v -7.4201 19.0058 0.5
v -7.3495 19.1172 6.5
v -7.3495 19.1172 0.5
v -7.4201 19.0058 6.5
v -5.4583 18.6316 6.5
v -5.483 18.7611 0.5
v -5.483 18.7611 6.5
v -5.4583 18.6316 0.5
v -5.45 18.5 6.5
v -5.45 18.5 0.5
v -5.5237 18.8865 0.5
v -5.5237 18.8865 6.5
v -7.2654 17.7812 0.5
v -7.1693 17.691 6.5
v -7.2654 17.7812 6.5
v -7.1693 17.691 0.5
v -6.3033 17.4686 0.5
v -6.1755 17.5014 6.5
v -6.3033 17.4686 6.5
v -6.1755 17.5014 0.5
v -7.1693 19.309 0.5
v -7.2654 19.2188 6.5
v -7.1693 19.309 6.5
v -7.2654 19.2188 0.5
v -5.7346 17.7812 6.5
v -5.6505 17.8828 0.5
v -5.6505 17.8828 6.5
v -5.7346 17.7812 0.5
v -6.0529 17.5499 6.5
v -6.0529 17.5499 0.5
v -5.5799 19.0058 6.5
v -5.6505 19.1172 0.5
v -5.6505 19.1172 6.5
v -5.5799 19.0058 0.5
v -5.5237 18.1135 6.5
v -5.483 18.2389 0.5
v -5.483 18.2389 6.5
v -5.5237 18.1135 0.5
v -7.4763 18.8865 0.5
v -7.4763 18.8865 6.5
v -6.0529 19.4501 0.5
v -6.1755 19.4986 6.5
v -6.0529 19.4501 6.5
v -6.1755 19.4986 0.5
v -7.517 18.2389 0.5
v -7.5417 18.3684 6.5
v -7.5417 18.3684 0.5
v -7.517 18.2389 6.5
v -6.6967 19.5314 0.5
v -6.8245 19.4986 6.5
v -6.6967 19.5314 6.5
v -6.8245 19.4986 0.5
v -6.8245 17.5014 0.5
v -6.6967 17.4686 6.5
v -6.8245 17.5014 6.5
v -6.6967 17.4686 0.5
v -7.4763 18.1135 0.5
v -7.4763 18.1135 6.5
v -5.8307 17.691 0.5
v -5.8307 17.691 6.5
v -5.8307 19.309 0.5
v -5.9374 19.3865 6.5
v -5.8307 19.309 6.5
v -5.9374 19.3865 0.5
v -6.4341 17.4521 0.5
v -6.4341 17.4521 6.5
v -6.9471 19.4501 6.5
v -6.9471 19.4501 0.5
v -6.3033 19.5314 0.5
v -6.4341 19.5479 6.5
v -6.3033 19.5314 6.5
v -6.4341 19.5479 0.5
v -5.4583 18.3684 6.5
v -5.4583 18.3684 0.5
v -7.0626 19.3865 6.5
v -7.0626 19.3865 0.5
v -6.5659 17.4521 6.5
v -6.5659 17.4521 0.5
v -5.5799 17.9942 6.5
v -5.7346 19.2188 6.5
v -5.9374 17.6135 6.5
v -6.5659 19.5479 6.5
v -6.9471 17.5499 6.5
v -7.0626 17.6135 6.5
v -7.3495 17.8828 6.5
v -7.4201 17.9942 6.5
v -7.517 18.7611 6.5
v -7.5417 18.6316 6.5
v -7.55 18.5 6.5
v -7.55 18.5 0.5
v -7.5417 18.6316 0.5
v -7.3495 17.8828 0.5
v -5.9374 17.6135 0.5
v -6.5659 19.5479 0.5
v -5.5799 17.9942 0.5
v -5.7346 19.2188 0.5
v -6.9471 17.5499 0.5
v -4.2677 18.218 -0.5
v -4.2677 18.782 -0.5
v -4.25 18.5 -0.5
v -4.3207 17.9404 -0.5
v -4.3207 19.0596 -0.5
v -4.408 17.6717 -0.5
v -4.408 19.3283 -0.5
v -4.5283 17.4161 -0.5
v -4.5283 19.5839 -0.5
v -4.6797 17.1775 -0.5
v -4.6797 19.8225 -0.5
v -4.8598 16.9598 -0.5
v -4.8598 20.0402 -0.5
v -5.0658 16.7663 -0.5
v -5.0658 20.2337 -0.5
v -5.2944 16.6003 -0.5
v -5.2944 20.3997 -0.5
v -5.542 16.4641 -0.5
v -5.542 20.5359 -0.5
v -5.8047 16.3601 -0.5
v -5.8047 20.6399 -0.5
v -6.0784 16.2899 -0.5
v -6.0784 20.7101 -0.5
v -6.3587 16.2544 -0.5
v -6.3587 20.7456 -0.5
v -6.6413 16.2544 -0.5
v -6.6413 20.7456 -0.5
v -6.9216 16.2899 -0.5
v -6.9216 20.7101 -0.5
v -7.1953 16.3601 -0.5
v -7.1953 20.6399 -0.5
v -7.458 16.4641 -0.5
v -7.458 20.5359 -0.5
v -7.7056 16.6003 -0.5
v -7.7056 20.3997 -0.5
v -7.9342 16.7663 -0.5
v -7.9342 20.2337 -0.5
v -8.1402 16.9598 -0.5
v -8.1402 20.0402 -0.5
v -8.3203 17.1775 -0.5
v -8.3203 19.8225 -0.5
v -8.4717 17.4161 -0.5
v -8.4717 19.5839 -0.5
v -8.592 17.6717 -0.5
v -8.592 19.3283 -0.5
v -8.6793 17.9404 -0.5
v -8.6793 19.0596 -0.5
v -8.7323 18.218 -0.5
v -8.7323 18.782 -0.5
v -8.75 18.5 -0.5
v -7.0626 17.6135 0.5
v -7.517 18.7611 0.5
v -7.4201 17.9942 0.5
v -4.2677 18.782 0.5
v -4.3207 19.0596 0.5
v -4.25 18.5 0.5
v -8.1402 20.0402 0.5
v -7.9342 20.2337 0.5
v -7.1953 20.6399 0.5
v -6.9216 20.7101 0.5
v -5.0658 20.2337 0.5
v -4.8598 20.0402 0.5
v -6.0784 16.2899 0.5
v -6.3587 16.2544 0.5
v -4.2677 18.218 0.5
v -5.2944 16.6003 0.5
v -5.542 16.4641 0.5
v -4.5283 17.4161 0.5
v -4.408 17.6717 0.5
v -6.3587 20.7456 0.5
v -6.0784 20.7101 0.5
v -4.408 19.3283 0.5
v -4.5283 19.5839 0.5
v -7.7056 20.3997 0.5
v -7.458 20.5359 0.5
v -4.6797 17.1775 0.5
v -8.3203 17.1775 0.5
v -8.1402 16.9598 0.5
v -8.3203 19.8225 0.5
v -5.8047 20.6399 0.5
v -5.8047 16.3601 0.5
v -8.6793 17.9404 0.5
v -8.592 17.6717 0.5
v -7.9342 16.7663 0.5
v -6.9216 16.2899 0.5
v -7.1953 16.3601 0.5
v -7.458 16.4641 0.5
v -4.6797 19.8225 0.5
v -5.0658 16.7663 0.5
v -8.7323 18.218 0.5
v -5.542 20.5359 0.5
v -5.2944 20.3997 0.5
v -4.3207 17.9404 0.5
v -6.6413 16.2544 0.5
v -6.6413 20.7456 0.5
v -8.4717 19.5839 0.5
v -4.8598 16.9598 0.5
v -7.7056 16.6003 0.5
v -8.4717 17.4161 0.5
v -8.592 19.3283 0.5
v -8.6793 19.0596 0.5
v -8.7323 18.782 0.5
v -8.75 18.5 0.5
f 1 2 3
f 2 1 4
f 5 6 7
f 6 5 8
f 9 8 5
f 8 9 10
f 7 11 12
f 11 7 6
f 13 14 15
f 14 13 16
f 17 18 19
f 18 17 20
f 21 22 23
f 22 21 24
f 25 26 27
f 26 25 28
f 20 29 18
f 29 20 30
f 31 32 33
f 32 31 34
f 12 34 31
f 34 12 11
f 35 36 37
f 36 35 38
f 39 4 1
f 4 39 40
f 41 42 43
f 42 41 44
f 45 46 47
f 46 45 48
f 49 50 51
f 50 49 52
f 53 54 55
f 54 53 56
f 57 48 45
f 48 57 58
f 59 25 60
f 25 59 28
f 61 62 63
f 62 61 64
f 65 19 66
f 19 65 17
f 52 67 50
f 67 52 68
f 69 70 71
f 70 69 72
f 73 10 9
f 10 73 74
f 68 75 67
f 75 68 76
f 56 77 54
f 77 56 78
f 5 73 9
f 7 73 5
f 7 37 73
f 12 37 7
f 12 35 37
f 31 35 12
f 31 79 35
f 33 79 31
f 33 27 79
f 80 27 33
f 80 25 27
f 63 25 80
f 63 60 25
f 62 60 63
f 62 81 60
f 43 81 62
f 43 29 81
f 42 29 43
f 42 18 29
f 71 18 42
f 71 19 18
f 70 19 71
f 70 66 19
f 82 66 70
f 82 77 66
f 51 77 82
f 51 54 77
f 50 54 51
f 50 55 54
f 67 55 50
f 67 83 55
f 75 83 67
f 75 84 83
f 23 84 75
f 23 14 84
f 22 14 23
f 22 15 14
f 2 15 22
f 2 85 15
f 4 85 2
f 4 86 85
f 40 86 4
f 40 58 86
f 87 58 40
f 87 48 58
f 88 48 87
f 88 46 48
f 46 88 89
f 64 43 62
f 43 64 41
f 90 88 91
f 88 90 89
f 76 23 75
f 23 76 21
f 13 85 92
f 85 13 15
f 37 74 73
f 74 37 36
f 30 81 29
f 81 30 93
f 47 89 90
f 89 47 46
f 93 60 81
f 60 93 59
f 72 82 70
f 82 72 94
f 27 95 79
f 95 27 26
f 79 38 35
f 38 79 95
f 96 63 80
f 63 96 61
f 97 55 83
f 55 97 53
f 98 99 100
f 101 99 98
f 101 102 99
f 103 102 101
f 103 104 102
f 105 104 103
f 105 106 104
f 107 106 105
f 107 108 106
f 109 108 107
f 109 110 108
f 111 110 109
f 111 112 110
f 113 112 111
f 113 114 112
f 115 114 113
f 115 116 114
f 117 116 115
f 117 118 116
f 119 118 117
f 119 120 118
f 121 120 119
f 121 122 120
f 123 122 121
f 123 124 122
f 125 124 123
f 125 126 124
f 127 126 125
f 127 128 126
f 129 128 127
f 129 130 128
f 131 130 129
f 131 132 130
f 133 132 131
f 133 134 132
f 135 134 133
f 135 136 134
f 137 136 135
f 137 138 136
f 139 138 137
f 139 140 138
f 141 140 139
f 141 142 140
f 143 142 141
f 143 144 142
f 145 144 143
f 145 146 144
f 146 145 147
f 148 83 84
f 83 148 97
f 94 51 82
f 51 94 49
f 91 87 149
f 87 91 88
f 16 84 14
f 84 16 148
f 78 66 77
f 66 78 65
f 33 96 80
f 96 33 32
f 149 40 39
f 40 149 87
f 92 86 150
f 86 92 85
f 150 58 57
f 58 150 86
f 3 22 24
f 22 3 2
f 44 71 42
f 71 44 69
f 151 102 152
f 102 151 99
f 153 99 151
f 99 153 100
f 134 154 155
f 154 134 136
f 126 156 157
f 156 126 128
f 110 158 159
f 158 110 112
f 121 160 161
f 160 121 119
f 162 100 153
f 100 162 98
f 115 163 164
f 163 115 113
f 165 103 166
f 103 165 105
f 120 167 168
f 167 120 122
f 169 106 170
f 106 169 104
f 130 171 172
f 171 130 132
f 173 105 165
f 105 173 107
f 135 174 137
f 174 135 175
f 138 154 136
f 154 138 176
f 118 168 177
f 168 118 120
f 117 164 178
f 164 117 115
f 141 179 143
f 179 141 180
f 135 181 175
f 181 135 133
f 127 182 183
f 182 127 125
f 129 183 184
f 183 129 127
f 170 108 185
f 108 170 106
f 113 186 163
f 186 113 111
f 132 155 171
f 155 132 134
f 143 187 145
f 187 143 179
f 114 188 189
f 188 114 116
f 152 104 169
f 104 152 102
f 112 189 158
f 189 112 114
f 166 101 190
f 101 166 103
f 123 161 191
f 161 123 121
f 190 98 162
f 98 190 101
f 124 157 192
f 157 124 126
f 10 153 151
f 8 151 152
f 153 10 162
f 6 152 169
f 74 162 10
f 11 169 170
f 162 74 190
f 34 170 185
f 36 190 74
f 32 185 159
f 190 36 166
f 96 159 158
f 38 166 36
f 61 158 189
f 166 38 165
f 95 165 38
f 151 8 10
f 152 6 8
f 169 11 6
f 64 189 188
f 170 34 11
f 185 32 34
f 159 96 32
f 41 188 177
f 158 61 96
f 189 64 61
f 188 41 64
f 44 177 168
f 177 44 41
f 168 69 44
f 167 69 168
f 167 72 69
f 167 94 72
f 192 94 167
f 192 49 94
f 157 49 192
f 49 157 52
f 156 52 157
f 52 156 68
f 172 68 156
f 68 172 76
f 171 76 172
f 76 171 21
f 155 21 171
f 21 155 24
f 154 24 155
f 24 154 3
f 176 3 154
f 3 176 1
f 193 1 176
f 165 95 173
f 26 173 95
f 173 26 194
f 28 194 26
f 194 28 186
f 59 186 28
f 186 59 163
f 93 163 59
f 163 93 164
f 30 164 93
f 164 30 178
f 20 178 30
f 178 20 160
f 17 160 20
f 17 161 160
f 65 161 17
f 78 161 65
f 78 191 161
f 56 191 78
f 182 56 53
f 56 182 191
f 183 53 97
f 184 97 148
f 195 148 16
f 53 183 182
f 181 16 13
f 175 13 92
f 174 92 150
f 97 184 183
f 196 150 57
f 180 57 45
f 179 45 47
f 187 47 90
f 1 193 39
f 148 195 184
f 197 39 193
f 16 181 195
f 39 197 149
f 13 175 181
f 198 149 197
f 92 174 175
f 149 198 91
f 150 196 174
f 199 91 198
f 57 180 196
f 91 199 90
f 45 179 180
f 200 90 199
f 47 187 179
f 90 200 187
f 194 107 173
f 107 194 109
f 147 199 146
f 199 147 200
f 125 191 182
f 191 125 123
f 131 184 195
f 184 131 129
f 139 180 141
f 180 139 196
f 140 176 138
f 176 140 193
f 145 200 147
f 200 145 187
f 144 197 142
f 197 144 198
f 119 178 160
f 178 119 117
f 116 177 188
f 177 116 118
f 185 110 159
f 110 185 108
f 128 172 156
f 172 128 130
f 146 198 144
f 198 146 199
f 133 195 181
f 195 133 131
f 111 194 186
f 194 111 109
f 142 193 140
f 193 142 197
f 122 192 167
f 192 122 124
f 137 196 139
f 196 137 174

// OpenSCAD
// KY-040 Rotary Encoder Module Model
// All measurements in millimeters
$fn = 50; // Resolution for circles

module ky040() {
    // PCB dimensions
    pcb_width = 26.5;
    pcb_depth = 19;
    pcb_thickness = 1.6;
    
    // PCB with mounting holes
    difference() {
        // Main PCB body
        color("green", 0.9)
        cube([pcb_width, pcb_depth, pcb_thickness]);
        
        // Mounting holes (2.5mm diameter)
        hole_diameter = 2.5;
        hole_offset_x = 2.5;
        hole_offset_y = 2.5;
        
        translate([hole_offset_x, hole_offset_y, -0.5])
            cylinder(h = pcb_thickness + 1, d = hole_diameter);
        
        translate([pcb_width - hole_offset_x, hole_offset_y, -0.5])
            cylinder(h = pcb_thickness + 1, d = hole_diameter);
    }
    
    // Rotary encoder body
    encoder_x = pcb_width / 2;
    encoder_y = pcb_depth / 2 + 1;
    
    translate([encoder_x, encoder_y, pcb_thickness]) {
        // Cubic base
        color("silver", 0.8)
        translate([-6.25, -6.25, 0])
            cube([12.5, 12.5, 7]);
        
        // Encoder shaft
        color("silver", 0.9)
        translate([0, 0, 7])
            cylinder(h = 15, d = 6);
        
        // Shaft flat (D-shaft)
        color("silver", 0.9)
        translate([0, 0, 7])
            difference() {
                cylinder(h = 15, d = 6);
                translate([2.5, -3, -0.5])
                    cube([2, 6, 16]);
            }
        
        // Threaded bushing
        color("silver", 0.7)
        translate([0, 0, -2])
            cylinder(h = 2, d = 7);
    }
    
    // Pin headers (5 pins)
    pin_spacing = 2.54;
    pin_start_y = (pcb_depth - (4 * pin_spacing)) / 2;
    pin_x = pcb_width - 2;
    
    for (i = [0:4]) {
        translate([pin_x, pin_start_y + i * pin_spacing, -2.5]) {
            // Pin below PCB
            color("gold", 0.9)
            cylinder(h = 2.5, d = 0.6);
            
            // Pin above PCB
            translate([0, 0, 2.5])
            color("black", 0.9)
            cube([2.5, pin_spacing * 0.8, pcb_thickness], center = true);
        }
    }
    
    // Small components on PCB (resistors/capacitors)
    for (i = [0:2]) {
        translate([7 + i * 4, 14, pcb_thickness]) {
            color("black", 0.8)
            cube([3, 1.5, 1.2]);
        }
    }
}

module knob() {
    color("black", 0.9) {
        cylinder(h = 10, d = 15);
        translate([0, 0, 10])
            cylinder(h = 3, d1 = 15, d2 = 13);
        // Indicator line
        translate([0, 5, 10])
            color("white")
            cube([1, 2, 3.5], center = true);
    }
}

module Ky040Mount(showpin = true, showMount = false) {
    // PCB dimensions
    pcb_width = 26.5;
    pcb_depth = 19;
    pcb_thickness = 1.6;
    
    // Mount parameters
    base_thickness = 3;
    wall_height = 8;
    wall_thickness = 2;
    clearance = 0.3; // For easier fitting
    
    // Mounting post parameters
    post_height = 3;
    post_outer_diameter = 4.5;
    post_inner_diameter = 2.2; // Slightly smaller than 2.5mm hole for press fit
    
    // Mounting hole positions
    hole_offset_x = 4.5;
    hole_offset_y = 16.5;
    
    if (showpin){
        pin();
    }
    
        if (showMount){
        mount();
    }
    
    module mount(){
    difference() {
    difference() {
        union() {
            // Base plate
            color("lightblue", 0.8)
            cube([pcb_width + wall_thickness * 2, 
                  pcb_depth + wall_thickness * 2, 
                  base_thickness]);
            
            // Mounting posts
            translate([wall_thickness + hole_offset_x, 
                      wall_thickness + hole_offset_y, 
                      base_thickness]) {
                color("lightblue", 0.8)
                cylinder(h = post_height, d = post_outer_diameter);
            }
            
            translate([wall_thickness + pcb_width - hole_offset_x, 
                      wall_thickness + hole_offset_y, 
                      base_thickness]) {
                color("lightblue", 0.8)
                cylinder(h = post_height, d = post_outer_diameter);
            }
            
            // Right wall 
            translate([pcb_width + wall_thickness -1, wall_thickness, 0])
                color("lightblue", 0.8)
                cube([wall_thickness + 1, pcb_depth, base_thickness + wall_height]);

            
            // Bottom wall (where pins are NOT located)
            translate([0, 0, 0])
                color("lightblue", 0.8)
                cube([pcb_width + wall_thickness * 2, wall_thickness+ 1, base_thickness + wall_height]);
        }
        
        // Screw holes in mounting posts (optional for M2 screws)
        translate([wall_thickness + hole_offset_x, 
                  wall_thickness + hole_offset_y, 
                  -0.5]) {
            cylinder(h = base_thickness + post_height + 1, d = post_inner_diameter);
        }
        
        translate([wall_thickness + pcb_width - hole_offset_x, 
                  wall_thickness + hole_offset_y, 
                  -0.5]) {
            cylinder(h = base_thickness + post_height + 1, d = post_inner_diameter);
                      
        }
    }
    translate([wall_thickness, wall_thickness, base_thickness + post_height]){
    cube([pcb_width,pcb_depth + 1,pcb_thickness + 0.25]);
    }
    }
}
    

    
    module pin(){
        
                translate([-(wall_thickness + hole_offset_x), 
                  wall_thickness + hole_offset_y, 
                  -0.5]) {
            cylinder(h = base_thickness + post_height + 1, d = post_inner_diameter-0.1);
                                  cylinder(h = 1, d = post_outer_diameter);
        }


}

}


// Render the mount
Ky040Mount();


//display mounting pins
//mountingPins();

// Render the KY-040 module positioned on the mount
//translate([26.5+2, 20, 6])
//    rotate([0,0,180]){
//    ky040();
//    }

// Add knob for visualization
//translate([15.25, 12.5, 30.6])
//    knob();
